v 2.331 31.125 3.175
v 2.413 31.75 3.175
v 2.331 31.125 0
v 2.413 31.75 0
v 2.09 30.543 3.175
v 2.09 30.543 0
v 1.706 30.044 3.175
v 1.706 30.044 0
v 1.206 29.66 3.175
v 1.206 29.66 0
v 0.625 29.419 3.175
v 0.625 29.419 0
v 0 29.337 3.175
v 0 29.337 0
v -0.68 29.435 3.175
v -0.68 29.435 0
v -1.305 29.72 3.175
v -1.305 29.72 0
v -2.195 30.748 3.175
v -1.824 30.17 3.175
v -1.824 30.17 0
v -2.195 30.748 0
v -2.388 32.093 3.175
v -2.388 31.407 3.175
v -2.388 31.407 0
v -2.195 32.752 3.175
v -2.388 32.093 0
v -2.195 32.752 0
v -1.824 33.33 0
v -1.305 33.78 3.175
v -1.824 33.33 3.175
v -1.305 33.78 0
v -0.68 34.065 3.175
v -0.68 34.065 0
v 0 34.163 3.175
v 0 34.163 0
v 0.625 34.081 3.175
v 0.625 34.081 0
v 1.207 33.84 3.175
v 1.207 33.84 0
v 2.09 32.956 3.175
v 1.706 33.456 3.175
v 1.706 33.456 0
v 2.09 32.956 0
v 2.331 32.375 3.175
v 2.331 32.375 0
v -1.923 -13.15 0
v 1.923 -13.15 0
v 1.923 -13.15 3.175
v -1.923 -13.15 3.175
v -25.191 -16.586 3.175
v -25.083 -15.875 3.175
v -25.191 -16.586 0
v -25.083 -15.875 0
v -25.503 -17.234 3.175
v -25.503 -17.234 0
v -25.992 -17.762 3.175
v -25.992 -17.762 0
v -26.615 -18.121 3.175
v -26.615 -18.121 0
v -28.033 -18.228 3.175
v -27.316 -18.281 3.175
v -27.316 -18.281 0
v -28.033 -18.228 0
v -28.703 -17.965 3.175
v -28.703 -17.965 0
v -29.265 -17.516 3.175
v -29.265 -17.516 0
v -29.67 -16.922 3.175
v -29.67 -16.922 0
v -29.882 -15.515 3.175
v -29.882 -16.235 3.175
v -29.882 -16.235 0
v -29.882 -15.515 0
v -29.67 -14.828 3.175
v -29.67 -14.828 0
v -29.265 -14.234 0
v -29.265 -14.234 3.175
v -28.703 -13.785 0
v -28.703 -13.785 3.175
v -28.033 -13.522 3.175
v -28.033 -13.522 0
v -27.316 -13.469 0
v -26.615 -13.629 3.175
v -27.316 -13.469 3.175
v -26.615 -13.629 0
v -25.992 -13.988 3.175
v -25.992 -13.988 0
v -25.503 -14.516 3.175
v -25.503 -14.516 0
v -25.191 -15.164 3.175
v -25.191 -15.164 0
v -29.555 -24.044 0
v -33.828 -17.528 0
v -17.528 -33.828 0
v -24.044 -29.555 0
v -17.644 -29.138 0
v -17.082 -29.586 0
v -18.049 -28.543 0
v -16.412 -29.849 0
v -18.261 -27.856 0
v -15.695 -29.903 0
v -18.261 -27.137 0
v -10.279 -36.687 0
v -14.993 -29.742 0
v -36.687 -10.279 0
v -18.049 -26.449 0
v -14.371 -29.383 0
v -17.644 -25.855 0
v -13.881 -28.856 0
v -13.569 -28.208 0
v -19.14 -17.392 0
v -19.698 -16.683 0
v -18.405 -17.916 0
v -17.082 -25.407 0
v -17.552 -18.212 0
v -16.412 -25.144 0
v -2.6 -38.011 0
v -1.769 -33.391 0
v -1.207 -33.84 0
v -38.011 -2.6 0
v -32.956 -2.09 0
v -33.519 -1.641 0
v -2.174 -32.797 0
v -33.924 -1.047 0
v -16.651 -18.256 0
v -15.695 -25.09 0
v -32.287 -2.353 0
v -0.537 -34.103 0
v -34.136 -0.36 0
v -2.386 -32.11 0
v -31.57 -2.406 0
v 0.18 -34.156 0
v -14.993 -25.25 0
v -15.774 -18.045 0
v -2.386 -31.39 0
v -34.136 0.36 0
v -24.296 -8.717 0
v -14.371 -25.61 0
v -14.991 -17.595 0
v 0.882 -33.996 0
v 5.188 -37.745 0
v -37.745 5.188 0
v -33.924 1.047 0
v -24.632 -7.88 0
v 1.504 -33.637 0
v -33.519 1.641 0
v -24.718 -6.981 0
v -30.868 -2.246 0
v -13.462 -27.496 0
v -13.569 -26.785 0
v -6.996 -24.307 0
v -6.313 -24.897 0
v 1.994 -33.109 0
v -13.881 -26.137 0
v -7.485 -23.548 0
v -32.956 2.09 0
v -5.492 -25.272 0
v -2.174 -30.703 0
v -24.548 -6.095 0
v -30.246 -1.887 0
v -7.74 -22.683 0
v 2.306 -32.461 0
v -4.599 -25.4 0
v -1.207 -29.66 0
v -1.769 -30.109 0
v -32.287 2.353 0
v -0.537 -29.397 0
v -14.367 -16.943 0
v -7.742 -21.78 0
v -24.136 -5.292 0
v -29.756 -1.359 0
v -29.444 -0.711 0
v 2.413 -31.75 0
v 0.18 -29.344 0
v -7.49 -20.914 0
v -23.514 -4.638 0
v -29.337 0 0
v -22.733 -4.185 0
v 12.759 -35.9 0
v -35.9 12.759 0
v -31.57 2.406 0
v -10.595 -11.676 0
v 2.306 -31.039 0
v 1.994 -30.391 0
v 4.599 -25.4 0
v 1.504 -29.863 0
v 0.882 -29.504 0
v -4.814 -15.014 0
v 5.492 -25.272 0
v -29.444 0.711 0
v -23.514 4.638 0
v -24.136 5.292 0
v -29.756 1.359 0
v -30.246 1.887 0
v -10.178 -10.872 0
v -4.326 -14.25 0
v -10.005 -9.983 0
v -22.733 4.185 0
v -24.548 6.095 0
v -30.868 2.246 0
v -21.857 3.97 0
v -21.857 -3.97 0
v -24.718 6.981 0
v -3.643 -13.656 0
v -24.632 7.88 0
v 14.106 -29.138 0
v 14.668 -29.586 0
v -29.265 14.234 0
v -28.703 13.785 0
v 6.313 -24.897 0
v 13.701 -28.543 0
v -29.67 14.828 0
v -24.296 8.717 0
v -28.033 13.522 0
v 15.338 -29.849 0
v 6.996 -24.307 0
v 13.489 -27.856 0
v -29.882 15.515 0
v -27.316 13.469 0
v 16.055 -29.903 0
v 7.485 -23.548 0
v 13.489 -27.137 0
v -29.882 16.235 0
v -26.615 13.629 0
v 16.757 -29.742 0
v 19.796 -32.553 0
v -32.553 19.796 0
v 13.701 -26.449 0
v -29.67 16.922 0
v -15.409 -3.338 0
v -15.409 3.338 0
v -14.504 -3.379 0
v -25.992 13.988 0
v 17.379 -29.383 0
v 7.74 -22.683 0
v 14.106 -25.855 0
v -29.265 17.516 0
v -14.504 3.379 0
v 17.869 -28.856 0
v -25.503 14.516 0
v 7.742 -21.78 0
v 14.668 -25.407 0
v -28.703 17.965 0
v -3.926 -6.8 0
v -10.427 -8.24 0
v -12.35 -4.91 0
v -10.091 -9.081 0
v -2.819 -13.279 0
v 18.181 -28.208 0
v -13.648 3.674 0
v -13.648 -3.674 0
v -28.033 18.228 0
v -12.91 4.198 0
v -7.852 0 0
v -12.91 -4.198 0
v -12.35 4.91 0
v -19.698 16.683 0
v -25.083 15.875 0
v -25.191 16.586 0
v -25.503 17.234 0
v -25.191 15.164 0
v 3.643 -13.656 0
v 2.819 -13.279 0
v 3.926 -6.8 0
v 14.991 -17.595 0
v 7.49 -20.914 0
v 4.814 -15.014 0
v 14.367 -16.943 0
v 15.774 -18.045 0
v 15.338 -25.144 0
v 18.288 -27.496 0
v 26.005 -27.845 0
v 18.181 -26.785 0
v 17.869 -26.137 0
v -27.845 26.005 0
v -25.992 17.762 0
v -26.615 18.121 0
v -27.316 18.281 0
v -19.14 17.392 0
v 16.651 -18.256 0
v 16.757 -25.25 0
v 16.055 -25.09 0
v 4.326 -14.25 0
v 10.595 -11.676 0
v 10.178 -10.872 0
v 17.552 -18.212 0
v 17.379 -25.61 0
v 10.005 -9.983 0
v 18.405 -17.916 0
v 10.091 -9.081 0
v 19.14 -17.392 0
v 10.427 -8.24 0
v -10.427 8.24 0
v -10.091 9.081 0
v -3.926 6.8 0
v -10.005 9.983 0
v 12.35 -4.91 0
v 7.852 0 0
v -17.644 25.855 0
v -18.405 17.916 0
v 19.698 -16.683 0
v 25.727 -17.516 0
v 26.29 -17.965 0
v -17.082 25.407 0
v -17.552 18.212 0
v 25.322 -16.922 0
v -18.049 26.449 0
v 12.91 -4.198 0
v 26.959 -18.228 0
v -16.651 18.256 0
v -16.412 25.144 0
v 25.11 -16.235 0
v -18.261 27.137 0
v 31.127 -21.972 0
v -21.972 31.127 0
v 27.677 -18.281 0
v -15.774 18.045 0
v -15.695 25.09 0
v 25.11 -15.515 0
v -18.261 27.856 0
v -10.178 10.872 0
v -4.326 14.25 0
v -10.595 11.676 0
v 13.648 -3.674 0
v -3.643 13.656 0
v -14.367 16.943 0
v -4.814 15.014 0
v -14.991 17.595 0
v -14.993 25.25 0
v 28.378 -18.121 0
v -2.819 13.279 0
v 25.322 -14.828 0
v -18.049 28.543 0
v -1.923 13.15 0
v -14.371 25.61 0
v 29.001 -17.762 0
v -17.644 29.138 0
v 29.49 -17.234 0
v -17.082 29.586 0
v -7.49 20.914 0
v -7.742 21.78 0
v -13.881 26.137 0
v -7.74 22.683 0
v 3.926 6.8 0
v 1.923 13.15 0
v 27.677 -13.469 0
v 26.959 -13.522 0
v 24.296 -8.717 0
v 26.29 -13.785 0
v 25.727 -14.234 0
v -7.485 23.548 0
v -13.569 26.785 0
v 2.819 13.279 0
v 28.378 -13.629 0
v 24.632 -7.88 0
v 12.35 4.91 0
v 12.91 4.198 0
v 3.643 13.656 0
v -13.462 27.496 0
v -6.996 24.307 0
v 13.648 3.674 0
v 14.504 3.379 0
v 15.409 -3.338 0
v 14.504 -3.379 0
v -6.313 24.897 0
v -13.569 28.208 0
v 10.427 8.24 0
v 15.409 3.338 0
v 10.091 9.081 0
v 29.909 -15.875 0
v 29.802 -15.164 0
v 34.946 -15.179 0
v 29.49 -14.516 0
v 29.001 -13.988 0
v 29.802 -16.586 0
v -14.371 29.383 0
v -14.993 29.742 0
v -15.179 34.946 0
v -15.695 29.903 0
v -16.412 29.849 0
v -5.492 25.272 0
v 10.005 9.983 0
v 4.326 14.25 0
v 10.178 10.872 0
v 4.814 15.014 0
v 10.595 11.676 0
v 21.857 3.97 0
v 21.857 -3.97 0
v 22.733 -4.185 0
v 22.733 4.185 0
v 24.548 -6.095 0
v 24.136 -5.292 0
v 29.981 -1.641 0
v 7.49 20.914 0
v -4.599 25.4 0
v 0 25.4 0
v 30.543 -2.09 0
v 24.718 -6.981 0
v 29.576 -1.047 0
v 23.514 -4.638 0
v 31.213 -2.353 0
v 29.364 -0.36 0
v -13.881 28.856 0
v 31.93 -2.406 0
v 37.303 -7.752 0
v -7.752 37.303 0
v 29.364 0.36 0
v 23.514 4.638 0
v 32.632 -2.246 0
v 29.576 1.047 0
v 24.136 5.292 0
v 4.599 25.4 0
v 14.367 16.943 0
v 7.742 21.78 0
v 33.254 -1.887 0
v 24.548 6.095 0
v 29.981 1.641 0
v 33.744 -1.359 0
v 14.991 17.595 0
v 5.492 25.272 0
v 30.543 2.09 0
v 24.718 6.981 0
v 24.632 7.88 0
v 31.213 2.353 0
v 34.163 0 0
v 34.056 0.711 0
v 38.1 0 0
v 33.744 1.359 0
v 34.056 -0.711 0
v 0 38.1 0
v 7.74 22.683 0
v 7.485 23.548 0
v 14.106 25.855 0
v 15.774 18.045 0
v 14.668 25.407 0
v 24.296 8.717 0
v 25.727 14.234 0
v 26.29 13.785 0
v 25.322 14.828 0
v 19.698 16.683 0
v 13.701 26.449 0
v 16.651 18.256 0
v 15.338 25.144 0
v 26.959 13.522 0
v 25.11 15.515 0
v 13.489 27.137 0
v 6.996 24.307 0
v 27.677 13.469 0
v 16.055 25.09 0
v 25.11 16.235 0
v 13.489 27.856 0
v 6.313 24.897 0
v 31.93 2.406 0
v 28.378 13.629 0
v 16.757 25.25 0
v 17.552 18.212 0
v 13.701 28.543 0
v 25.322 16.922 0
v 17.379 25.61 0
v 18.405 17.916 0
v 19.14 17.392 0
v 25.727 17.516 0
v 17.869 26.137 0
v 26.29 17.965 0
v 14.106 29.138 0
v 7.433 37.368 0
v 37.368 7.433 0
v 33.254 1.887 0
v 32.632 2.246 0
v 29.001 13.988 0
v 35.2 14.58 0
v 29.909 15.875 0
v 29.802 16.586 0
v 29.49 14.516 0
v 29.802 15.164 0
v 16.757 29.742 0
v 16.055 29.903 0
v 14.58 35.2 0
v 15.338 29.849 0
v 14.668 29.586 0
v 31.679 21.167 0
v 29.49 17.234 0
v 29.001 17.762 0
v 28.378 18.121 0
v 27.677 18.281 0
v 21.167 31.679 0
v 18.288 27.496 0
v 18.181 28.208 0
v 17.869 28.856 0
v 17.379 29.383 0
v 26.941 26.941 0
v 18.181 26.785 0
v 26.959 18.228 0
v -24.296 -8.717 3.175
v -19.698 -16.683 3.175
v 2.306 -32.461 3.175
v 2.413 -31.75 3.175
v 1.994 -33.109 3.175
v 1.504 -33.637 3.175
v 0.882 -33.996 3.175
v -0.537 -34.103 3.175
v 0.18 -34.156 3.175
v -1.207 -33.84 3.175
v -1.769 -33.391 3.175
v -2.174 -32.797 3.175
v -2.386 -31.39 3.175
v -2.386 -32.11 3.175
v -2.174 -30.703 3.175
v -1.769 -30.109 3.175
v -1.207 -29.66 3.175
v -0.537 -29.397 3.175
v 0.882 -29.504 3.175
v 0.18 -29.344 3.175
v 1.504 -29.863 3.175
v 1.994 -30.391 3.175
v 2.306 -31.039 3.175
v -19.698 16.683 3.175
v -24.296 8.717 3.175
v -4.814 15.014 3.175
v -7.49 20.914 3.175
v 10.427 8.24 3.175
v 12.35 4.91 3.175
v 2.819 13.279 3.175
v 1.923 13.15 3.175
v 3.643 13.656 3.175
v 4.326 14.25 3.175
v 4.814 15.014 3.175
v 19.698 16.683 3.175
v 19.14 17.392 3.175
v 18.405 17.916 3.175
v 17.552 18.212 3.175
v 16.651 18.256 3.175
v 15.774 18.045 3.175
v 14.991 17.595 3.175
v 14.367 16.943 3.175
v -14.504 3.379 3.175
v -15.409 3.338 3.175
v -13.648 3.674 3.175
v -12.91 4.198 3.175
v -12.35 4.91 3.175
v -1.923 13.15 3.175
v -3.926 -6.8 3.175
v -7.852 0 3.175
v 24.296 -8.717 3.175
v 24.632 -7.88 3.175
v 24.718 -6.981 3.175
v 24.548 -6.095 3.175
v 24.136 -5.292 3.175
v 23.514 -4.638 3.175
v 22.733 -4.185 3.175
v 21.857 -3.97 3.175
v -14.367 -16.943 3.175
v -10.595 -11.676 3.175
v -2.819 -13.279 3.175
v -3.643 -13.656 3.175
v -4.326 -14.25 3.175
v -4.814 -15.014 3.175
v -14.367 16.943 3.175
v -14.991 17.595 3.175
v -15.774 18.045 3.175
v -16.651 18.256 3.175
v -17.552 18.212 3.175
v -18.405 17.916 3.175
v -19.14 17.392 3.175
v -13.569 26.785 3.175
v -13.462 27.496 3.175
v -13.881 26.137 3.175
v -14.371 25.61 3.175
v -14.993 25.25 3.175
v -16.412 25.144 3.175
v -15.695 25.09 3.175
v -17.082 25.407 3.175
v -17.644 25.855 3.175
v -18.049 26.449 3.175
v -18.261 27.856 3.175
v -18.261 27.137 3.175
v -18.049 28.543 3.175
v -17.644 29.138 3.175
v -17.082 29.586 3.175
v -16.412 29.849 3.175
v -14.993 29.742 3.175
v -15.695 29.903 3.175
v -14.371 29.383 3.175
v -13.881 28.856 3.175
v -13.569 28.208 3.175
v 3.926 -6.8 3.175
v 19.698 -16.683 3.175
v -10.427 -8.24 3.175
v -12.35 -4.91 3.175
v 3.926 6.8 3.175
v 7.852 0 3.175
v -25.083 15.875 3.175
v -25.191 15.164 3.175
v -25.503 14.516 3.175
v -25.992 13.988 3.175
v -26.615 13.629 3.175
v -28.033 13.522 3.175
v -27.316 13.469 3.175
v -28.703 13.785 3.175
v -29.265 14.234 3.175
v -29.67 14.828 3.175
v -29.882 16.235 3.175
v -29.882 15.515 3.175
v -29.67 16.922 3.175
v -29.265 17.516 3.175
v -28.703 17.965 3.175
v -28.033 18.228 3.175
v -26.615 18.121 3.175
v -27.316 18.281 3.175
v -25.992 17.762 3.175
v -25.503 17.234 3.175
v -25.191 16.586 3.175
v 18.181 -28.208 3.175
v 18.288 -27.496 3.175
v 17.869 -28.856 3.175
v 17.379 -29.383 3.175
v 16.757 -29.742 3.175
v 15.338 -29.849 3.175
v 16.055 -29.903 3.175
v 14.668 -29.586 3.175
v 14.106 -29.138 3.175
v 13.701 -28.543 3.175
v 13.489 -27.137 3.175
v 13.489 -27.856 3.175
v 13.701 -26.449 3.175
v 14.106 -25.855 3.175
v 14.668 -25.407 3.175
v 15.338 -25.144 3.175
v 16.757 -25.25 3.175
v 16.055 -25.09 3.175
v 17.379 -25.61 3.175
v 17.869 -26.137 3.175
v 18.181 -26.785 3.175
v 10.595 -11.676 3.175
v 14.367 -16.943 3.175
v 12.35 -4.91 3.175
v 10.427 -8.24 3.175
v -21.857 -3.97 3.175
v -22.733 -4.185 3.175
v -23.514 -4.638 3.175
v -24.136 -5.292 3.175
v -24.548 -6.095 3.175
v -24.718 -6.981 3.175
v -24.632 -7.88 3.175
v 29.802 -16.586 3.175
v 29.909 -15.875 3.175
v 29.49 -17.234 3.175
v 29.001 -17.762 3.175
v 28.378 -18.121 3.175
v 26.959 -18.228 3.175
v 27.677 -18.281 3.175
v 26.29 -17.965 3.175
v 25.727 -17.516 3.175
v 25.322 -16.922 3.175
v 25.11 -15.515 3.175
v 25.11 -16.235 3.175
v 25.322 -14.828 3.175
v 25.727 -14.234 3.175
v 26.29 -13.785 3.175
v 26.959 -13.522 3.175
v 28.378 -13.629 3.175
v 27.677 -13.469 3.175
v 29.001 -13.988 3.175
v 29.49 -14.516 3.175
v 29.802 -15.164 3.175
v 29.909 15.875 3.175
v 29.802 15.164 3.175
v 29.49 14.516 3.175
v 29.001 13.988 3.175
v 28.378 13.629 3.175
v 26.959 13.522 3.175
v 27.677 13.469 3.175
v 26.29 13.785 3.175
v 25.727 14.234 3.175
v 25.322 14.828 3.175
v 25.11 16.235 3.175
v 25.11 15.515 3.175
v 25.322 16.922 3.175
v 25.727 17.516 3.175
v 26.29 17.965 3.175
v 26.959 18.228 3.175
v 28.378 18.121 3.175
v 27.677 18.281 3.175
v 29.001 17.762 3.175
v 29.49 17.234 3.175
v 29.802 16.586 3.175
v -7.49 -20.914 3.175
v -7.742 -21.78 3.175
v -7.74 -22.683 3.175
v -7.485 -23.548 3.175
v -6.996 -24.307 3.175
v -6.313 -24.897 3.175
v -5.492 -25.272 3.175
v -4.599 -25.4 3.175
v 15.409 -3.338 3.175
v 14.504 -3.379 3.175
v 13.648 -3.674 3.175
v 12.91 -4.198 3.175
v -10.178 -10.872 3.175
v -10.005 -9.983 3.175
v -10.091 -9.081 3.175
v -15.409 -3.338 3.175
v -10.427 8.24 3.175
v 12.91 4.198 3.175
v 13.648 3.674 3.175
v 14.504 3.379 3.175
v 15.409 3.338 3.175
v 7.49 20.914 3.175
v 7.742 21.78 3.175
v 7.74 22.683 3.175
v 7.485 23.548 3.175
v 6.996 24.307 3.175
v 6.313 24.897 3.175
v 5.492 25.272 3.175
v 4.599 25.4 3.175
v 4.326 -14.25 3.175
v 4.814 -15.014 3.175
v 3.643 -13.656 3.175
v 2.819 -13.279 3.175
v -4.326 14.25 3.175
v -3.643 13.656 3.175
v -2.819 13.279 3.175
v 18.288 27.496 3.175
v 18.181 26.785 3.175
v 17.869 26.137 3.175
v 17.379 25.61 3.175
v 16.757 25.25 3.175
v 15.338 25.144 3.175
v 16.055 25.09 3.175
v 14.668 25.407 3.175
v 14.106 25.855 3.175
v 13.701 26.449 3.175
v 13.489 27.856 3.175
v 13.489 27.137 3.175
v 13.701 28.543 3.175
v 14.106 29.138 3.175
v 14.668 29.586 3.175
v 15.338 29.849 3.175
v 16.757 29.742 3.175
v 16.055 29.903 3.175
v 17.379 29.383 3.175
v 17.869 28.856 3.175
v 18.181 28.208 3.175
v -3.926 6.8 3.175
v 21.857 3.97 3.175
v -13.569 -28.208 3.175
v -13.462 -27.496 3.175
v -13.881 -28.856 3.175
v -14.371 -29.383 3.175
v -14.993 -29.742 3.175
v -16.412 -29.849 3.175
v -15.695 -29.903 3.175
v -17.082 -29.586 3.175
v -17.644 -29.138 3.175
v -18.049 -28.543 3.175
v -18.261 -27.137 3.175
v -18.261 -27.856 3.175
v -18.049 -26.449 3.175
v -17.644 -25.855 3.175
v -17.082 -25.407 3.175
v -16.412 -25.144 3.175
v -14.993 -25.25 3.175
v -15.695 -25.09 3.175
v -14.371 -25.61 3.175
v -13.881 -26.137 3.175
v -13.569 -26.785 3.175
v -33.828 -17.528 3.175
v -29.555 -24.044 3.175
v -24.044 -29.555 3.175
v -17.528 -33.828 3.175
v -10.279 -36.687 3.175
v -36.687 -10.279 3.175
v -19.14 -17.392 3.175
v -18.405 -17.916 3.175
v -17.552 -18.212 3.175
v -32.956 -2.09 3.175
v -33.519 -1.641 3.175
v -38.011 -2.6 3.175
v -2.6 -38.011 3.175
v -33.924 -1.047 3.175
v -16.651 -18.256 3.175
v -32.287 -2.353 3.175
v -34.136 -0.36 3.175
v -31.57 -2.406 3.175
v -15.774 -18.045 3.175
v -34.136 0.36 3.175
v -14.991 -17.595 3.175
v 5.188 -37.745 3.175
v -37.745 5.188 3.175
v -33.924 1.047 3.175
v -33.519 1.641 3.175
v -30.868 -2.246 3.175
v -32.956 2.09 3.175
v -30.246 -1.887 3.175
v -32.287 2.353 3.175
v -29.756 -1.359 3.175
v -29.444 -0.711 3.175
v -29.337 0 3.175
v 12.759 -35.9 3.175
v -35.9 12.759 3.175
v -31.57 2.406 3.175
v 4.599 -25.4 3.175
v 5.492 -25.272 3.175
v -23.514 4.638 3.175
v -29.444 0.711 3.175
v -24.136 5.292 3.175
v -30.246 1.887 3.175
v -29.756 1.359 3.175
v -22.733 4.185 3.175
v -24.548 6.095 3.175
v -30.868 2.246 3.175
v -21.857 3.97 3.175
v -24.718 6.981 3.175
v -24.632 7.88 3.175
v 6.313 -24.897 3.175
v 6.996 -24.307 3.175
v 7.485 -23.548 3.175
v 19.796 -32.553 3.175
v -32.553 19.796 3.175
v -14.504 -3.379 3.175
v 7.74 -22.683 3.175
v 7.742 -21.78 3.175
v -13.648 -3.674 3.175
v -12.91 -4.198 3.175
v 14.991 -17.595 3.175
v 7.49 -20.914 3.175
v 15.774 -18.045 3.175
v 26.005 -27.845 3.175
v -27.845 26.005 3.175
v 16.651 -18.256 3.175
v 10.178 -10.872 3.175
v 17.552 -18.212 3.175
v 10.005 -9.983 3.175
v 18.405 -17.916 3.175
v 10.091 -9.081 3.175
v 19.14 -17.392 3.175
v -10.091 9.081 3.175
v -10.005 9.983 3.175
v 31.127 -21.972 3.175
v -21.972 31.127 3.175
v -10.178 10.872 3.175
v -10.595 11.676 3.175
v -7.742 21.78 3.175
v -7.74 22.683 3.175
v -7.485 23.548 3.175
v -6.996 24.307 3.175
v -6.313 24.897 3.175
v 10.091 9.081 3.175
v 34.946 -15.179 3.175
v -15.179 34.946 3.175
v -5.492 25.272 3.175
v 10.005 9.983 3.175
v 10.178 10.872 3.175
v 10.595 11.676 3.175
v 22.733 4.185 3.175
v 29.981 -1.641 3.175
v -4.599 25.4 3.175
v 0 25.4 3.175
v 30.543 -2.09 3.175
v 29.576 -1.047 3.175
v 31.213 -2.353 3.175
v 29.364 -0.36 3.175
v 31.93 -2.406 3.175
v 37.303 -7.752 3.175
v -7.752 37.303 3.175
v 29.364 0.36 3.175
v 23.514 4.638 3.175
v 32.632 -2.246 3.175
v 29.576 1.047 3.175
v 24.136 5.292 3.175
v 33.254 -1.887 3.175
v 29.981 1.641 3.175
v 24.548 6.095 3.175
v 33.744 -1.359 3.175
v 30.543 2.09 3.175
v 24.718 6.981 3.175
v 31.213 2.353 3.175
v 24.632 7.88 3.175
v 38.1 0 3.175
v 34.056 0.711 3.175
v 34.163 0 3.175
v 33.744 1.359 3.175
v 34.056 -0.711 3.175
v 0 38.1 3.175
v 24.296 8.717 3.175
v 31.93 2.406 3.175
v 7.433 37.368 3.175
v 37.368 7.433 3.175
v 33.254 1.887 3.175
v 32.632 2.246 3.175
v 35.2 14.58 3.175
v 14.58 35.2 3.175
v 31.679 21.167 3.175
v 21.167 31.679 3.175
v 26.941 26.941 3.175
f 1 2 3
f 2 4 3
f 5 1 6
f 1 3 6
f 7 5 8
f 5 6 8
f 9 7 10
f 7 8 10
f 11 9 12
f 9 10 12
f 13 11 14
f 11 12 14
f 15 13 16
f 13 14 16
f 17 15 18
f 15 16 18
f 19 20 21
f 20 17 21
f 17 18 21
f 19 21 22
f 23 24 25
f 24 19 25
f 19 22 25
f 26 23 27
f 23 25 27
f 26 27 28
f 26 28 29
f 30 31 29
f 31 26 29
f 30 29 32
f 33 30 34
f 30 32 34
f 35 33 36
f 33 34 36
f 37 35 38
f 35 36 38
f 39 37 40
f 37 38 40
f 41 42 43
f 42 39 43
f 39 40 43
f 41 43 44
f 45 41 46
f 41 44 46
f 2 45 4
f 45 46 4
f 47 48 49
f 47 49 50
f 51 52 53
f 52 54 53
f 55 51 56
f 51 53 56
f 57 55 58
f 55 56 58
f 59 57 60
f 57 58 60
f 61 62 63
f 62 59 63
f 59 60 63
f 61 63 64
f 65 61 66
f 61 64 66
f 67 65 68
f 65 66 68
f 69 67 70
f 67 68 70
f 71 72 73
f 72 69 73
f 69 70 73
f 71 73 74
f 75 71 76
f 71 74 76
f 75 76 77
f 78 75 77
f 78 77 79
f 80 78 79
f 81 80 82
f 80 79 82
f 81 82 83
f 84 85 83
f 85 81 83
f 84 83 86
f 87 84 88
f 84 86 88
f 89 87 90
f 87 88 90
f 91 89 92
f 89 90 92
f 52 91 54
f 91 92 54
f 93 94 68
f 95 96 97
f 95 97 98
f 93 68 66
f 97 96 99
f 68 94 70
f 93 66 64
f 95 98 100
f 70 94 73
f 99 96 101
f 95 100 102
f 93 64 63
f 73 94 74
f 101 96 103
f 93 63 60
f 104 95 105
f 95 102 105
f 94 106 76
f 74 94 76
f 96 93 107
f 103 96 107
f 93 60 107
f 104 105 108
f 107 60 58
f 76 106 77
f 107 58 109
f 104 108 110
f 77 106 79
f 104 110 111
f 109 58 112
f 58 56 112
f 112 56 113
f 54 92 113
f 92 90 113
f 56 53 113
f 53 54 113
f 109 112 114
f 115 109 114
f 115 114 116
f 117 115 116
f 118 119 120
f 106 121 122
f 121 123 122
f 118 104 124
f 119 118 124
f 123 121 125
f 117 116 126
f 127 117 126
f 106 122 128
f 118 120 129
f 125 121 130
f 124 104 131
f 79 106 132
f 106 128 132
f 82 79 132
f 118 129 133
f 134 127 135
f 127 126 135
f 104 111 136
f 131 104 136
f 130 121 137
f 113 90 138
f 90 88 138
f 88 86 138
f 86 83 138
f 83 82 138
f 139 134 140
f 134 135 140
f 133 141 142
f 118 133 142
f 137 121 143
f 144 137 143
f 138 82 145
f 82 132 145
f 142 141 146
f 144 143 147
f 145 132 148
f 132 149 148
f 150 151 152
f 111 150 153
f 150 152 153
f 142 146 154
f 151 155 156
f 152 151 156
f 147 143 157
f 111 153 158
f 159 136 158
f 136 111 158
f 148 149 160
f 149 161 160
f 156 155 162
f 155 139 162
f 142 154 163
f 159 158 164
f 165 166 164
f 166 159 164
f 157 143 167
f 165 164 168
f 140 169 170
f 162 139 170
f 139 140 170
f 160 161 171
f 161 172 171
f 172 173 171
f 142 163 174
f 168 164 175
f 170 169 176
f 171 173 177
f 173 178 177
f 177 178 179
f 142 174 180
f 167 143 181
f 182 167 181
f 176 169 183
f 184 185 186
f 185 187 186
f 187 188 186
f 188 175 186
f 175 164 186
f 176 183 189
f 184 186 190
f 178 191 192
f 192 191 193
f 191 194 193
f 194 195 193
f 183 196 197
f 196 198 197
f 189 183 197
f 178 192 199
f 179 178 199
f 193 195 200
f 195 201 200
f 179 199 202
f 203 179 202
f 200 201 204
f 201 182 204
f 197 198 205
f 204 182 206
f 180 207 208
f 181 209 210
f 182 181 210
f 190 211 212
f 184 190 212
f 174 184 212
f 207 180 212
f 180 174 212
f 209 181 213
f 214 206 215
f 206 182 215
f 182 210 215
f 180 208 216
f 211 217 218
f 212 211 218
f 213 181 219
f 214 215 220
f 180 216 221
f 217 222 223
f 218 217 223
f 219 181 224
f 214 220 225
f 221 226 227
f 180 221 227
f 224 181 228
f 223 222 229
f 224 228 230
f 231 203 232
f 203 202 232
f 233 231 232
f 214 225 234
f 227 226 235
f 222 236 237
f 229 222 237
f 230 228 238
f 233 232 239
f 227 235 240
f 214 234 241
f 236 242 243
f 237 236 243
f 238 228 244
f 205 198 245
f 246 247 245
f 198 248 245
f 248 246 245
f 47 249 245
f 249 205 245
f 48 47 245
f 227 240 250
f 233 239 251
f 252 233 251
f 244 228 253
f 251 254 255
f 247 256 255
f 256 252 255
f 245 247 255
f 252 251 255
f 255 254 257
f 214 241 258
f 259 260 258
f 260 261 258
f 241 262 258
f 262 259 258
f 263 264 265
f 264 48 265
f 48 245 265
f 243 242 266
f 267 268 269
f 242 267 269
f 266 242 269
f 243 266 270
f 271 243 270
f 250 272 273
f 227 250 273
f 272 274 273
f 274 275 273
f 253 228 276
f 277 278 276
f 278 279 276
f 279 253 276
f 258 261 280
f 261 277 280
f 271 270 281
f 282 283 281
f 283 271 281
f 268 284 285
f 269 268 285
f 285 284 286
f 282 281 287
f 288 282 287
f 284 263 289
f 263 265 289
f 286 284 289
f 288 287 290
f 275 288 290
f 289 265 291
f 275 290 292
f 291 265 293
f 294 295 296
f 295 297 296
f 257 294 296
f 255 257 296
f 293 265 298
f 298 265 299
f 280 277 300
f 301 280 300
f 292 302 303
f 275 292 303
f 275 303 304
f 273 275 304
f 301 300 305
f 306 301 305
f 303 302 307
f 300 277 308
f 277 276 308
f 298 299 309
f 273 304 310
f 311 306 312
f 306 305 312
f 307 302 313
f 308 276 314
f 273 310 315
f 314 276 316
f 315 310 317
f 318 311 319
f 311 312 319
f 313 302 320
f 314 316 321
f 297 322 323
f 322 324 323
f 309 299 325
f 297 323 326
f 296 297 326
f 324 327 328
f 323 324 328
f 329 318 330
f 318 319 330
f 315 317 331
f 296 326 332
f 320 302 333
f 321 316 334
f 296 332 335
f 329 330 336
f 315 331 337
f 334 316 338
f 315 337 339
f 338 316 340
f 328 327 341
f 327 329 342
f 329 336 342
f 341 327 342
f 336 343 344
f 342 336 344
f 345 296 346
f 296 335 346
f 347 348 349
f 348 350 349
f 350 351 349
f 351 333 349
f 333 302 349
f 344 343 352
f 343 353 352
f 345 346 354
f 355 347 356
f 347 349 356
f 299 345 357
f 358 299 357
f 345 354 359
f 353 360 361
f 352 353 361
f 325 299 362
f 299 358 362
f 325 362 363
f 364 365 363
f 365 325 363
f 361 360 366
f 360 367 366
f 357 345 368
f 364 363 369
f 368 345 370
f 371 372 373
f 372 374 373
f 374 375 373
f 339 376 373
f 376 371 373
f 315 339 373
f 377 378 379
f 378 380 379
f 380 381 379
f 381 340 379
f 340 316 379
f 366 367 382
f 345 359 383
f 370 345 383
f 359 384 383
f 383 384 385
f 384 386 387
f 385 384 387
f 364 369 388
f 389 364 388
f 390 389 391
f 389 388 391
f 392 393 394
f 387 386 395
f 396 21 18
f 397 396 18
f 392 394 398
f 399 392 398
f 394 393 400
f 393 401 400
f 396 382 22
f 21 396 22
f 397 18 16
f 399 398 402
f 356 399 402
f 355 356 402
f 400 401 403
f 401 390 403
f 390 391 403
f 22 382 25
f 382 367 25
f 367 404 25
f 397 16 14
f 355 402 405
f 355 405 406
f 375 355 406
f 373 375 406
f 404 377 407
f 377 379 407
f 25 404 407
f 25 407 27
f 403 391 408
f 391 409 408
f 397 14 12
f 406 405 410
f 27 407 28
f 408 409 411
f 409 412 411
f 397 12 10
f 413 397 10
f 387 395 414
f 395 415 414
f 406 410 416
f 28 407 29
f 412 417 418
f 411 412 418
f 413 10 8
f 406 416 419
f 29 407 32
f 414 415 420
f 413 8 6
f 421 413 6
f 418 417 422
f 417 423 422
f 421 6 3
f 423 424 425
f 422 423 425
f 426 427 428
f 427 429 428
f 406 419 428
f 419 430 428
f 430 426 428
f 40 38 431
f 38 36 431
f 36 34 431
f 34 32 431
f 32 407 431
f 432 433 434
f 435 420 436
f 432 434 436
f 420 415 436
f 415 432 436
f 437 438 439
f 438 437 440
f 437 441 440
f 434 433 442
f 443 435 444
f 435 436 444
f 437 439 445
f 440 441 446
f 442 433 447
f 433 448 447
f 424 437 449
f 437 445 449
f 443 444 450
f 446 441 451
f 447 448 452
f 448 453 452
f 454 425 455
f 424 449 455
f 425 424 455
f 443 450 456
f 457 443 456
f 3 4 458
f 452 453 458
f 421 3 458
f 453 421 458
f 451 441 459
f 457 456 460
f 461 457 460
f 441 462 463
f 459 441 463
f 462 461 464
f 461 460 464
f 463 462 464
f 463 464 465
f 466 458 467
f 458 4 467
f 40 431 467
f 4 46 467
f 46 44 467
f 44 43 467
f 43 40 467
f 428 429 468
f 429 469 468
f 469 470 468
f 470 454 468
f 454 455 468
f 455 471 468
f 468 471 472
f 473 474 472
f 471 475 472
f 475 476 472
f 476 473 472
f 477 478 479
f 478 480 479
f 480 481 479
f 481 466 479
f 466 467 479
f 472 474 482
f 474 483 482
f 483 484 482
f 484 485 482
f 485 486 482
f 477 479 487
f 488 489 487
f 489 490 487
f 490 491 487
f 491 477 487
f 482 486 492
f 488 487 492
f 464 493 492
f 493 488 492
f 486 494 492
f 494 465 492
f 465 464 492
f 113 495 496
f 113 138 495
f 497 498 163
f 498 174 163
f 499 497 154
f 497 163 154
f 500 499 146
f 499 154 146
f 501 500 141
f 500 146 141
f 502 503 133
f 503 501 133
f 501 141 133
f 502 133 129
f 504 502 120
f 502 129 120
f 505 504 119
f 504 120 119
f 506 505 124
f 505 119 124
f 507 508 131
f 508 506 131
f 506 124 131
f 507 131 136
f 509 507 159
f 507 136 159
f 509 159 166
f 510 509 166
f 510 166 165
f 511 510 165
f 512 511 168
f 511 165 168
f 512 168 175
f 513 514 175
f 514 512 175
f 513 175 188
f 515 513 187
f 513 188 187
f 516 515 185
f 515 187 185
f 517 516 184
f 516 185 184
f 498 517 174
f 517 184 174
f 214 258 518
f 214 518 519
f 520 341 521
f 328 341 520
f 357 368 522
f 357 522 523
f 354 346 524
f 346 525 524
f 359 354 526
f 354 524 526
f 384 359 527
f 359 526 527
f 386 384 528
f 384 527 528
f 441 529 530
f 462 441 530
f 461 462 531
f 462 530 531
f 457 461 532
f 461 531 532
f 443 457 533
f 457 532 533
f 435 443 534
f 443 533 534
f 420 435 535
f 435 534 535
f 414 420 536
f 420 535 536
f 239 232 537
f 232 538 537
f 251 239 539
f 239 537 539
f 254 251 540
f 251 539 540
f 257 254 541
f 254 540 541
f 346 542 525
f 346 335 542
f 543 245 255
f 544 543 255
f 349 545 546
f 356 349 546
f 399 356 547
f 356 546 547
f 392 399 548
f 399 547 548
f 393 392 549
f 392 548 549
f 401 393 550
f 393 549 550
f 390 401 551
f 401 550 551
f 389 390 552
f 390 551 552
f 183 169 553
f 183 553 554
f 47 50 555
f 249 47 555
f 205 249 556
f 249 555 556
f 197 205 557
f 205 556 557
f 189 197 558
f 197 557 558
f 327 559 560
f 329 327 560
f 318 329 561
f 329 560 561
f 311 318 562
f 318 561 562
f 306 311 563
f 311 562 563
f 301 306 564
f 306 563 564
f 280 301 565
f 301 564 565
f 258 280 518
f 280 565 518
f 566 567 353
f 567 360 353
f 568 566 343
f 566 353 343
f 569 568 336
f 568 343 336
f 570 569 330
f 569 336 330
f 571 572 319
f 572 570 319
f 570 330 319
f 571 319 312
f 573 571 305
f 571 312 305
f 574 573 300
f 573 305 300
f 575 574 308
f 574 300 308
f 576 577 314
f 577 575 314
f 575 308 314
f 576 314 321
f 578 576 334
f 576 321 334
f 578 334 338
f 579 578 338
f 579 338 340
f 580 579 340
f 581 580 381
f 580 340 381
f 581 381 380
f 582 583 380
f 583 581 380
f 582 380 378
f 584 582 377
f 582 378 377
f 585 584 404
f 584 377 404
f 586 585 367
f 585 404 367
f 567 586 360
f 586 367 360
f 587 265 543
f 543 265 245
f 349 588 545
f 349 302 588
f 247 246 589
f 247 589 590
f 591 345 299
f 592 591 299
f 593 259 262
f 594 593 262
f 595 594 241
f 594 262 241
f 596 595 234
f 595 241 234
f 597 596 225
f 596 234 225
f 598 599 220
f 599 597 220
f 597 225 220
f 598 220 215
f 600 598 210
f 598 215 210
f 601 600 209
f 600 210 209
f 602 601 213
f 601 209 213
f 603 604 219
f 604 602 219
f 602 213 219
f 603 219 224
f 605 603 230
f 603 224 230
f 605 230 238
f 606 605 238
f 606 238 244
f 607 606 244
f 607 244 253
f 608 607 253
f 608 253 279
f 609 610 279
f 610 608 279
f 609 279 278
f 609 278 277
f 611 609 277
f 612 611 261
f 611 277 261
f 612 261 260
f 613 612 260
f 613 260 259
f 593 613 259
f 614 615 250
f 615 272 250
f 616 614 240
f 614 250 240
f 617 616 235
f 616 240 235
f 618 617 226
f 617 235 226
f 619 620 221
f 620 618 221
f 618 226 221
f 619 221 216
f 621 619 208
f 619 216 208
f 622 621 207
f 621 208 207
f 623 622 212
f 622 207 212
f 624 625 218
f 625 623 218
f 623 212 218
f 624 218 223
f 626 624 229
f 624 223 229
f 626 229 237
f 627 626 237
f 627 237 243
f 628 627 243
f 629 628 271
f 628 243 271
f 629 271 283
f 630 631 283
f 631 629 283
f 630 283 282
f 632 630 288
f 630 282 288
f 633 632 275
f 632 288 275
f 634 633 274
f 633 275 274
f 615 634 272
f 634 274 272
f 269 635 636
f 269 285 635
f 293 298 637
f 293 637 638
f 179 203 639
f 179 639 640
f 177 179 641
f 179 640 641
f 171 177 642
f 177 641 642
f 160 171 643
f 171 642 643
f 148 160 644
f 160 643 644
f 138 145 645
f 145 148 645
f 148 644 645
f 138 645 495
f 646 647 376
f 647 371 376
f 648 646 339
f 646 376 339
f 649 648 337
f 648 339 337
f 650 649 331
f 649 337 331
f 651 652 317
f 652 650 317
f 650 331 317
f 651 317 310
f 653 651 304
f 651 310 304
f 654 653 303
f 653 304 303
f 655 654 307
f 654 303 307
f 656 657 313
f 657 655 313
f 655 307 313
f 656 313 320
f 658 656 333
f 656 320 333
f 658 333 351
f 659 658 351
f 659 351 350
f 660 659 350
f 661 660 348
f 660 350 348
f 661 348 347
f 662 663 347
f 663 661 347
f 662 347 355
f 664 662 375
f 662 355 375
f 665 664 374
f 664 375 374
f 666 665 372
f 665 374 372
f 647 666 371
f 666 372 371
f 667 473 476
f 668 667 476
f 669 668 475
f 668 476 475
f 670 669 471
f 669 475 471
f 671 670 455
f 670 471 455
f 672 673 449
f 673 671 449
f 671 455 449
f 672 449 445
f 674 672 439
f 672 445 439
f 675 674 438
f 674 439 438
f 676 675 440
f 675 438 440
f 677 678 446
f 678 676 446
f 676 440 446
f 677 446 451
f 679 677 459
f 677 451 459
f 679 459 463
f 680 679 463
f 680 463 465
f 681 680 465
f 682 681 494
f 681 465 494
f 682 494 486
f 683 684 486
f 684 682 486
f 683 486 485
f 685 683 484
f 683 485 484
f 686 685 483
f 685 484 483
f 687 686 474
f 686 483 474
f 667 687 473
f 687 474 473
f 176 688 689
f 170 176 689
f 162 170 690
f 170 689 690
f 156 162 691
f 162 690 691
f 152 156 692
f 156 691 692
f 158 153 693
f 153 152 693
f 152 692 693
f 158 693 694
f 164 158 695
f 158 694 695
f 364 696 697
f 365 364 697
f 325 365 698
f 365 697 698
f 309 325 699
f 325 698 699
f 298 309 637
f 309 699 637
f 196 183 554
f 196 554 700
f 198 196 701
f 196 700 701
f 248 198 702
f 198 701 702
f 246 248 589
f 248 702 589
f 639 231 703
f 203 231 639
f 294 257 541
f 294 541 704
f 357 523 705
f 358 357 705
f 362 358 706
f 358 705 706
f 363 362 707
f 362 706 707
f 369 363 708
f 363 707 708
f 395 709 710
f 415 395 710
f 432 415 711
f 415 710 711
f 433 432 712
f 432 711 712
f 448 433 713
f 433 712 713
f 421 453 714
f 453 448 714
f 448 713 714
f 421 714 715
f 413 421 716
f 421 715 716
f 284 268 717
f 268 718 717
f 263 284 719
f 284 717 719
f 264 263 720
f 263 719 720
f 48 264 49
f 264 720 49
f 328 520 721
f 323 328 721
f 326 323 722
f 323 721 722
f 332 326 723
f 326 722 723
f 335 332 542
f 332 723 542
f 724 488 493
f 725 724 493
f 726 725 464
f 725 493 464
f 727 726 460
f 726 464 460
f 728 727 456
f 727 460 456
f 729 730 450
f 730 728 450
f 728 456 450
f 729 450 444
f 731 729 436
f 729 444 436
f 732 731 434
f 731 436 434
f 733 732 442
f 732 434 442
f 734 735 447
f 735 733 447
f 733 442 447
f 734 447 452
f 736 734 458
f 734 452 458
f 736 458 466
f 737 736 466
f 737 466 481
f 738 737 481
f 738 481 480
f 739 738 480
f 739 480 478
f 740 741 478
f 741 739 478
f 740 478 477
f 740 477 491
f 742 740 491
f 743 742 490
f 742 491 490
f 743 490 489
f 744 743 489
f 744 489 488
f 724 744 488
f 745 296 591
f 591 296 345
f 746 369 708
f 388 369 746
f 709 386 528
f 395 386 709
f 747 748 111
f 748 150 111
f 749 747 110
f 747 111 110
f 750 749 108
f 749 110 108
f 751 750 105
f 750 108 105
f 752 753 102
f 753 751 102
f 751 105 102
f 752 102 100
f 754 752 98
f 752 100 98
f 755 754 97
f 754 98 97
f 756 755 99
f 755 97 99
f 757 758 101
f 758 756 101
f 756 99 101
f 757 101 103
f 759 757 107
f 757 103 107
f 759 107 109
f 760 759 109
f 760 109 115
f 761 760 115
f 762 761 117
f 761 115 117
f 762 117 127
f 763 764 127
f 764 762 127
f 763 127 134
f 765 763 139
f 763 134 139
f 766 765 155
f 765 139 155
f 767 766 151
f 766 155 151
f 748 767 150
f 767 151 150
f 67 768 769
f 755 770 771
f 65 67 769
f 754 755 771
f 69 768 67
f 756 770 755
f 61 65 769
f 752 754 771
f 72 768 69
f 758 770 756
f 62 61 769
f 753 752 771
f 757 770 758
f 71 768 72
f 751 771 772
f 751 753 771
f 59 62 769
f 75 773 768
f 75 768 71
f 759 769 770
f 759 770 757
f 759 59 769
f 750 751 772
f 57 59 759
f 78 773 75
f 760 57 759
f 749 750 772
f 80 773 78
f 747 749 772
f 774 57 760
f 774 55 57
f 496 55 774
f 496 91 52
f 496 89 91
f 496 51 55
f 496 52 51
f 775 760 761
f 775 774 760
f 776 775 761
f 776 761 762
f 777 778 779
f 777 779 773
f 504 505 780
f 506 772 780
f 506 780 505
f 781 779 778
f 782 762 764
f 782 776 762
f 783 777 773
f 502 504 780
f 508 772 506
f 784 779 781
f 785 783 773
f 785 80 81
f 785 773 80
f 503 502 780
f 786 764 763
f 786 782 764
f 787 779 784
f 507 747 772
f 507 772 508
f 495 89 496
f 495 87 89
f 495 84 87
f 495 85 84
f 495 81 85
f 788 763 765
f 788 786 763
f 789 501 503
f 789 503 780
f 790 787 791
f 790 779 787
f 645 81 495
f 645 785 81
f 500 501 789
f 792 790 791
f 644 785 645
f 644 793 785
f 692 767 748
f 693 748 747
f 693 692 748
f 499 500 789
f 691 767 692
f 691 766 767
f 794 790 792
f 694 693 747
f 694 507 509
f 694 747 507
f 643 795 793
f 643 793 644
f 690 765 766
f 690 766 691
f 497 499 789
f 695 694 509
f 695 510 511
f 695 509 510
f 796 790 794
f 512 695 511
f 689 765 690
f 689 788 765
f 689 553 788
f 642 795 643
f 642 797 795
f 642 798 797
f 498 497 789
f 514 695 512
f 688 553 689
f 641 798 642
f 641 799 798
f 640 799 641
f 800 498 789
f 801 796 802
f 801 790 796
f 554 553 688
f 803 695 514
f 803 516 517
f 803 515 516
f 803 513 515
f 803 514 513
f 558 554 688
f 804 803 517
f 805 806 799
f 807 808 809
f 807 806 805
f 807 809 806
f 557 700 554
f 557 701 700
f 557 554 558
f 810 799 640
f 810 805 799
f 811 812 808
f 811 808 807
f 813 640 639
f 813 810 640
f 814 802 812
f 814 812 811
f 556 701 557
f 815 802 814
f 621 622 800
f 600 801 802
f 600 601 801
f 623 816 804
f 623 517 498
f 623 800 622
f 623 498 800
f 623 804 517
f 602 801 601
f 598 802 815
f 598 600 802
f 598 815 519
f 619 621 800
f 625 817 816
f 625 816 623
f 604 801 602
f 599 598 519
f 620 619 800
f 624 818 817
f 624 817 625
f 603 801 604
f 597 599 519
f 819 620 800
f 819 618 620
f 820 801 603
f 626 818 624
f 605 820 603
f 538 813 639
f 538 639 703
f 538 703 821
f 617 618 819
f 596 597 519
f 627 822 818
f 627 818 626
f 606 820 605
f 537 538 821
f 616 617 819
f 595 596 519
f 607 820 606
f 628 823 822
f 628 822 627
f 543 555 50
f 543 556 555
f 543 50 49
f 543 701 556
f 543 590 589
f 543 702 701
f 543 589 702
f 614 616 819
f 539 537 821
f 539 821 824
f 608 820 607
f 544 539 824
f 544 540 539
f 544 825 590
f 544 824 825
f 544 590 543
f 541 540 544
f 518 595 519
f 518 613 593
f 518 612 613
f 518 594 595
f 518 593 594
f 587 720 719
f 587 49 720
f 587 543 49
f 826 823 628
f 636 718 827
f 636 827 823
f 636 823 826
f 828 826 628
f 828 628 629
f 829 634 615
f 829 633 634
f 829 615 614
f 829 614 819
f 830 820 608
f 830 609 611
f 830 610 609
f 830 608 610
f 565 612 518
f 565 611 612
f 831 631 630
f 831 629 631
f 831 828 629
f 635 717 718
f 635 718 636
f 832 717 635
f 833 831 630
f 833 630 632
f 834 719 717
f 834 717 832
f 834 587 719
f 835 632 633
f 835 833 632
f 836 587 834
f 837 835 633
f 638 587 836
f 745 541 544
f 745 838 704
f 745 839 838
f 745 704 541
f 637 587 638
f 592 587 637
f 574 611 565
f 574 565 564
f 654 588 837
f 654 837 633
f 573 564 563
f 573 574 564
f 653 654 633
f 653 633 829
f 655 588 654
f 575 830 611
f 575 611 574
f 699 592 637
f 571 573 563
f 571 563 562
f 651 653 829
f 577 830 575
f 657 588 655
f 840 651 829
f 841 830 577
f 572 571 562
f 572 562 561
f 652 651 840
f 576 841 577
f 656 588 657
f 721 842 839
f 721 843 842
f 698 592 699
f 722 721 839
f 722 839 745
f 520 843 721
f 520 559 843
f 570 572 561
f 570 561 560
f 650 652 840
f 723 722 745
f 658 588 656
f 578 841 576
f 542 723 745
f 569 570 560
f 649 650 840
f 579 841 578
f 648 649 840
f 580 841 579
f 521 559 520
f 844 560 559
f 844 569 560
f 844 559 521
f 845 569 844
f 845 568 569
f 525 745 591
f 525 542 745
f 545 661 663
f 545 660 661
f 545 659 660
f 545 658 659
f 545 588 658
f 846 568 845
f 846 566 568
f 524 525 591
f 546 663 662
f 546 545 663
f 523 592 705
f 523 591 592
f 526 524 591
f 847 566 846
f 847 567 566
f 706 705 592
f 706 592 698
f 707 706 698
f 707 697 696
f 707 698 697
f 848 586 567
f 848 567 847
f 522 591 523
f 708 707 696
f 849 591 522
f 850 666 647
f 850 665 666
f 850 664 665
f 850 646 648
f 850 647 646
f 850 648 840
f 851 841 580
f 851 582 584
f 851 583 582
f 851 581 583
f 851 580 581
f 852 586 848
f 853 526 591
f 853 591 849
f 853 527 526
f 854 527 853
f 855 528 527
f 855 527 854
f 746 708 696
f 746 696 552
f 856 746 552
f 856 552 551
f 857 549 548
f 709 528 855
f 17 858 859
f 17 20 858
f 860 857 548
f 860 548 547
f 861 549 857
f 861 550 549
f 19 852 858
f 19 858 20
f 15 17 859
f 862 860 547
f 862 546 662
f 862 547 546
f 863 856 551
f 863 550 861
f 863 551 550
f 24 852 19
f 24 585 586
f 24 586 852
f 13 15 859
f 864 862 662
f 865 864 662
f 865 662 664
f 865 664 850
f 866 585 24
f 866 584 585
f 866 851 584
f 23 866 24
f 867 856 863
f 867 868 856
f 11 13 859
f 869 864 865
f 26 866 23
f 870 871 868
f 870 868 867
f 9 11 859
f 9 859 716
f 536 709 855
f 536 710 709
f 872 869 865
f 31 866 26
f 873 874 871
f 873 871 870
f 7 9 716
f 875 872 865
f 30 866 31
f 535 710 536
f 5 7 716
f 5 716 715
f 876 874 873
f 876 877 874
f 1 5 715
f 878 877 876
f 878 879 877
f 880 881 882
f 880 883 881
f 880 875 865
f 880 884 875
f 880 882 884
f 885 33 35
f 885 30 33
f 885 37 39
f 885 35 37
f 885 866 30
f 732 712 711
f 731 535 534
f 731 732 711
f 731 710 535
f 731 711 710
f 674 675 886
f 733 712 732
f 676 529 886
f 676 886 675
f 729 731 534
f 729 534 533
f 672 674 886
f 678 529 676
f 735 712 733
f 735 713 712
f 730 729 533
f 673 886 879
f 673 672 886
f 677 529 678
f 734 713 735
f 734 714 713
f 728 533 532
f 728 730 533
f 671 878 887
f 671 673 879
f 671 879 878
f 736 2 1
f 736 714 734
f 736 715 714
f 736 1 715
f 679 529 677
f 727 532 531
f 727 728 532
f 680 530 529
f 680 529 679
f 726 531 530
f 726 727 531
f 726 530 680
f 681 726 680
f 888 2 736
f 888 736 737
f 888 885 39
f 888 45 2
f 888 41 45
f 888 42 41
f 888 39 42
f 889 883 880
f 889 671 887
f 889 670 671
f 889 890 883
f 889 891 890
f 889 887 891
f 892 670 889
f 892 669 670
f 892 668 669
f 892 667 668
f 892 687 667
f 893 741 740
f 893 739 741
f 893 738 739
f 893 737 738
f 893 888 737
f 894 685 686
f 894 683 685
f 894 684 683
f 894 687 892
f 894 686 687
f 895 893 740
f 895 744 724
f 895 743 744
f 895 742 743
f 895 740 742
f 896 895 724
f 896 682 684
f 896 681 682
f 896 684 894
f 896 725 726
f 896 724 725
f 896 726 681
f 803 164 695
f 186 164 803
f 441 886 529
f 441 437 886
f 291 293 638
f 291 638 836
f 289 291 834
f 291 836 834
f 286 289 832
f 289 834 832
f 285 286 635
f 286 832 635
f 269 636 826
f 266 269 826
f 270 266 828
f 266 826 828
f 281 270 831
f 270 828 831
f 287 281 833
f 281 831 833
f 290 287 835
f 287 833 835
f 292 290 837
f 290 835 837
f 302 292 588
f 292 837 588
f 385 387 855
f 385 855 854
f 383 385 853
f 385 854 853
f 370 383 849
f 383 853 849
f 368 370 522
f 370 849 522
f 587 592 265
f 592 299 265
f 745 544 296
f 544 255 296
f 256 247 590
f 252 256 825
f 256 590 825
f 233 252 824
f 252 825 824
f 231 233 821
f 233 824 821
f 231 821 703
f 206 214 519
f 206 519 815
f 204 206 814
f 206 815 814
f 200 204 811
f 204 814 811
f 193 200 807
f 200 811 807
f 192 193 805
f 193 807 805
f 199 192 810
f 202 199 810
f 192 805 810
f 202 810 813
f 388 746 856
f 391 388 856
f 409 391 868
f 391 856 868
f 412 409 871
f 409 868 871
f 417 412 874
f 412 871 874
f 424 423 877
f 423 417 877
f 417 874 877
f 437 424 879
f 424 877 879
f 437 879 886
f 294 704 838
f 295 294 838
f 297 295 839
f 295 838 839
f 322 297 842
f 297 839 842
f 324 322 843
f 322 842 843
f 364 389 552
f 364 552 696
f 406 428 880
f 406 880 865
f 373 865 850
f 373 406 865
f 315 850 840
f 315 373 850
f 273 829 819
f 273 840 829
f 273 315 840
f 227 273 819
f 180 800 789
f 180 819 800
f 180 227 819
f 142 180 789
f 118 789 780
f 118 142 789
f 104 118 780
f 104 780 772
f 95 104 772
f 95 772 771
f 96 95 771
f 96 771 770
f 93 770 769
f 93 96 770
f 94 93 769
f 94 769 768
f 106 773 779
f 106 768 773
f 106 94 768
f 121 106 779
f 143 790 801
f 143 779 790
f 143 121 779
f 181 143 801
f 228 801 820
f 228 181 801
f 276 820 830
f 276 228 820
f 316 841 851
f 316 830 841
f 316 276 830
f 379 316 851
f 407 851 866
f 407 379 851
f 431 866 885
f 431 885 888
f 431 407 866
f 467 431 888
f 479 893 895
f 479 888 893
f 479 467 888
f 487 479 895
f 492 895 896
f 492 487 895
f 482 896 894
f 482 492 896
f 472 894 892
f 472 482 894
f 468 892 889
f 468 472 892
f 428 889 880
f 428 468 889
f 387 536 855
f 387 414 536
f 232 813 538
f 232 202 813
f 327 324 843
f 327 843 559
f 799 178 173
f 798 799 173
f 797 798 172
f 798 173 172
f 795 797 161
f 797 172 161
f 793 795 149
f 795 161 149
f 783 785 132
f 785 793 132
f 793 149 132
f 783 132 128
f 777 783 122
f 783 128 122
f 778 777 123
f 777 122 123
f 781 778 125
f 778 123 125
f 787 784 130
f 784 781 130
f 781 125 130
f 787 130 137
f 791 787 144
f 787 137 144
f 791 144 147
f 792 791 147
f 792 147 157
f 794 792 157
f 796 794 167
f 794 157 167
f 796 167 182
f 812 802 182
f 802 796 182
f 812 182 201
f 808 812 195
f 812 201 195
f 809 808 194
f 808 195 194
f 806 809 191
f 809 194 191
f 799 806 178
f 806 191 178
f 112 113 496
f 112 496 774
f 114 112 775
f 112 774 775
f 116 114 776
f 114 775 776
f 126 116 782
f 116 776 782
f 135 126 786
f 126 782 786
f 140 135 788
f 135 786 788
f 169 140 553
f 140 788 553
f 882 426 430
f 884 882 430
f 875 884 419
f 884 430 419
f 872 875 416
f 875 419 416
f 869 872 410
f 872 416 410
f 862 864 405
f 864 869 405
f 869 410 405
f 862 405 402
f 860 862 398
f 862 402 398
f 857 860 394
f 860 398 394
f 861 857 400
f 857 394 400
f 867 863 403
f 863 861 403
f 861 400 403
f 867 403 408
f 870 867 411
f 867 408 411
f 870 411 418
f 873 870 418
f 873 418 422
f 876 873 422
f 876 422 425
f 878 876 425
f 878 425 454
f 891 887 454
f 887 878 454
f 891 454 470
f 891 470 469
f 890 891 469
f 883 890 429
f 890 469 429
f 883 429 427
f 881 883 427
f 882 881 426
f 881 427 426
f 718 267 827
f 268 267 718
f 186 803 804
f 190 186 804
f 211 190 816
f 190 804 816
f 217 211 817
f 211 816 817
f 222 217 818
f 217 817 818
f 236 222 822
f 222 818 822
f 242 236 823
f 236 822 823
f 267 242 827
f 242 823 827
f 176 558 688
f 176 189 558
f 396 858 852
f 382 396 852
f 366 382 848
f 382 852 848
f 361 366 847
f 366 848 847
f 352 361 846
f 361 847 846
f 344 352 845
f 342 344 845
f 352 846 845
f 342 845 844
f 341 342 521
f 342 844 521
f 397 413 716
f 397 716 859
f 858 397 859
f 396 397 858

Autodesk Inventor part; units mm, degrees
ref_plane "YZ Plane" through (0, 0, 0) normal (1, 0, 0) x (0, 1, 0)
ref_plane "XZ Plane" through (0, 0, 0) normal (0, 1, 0) x (-1, 0, 0)
ref_plane "XY Plane" through (0, 0, 0) normal (0, 0, 1) x (1, 0, 0)
sketch "Sketch1" plane through (0, 0, 0) normal (0, 0, 1) x (1, 0, 0)
  circle A0 centre (0, 0) radius 38.1
  line L0 (7.852, 0) -> (3.926, -6.8)
  line L1 (3.926, -6.8) -> (-3.926, -6.8)
  line L2 (-3.926, -6.8) -> (-7.852, 0)
  line L3 (-7.852, 0) -> (-3.926, 6.8)
  line L4 (-3.926, 6.8) -> (3.926, 6.8)
  line L5 (3.926, 6.8) -> (7.852, 0)
  circle A1 centre (0, 0) radius 31.75 construction
  circle A2 centre (0, 31.75) radius 2.413
  circle A3 centre (-15.875, 27.4963) radius 2.413
  circle A4 centre (-27.4963, 15.875) radius 2.413
  circle A5 centre (-31.75, 0) radius 2.413
  circle A6 centre (-27.4963, -15.875) radius 2.413
  circle A7 centre (-15.875, -27.4963) radius 2.413
  circle A8 centre (0, -31.75) radius 2.413
  circle A9 centre (15.875, -27.4963) radius 2.413
  circle A10 centre (27.4963, -15.875) radius 2.413
  circle A11 centre (31.75, 0) radius 2.413
  circle A12 centre (27.4963, 15.875) radius 2.413
  circle A13 centre (15.875, 27.4963) radius 2.413
  line L6 (-9.525, 25.4) -> (-3.9688, 13.15)
  line L7 (-3.9688, 13.15) -> (3.9688, 13.15)
  line L8 (3.9688, 13.15) -> (9.525, 25.4)
  line L9 (9.525, 25.4) -> (-9.525, 25.4)
  line L10 (0, -53.34) -> (0, 53.34) construction
  circle A14 centre (0, 0) radius 25.4 construction
  line L11 (0, 29.337) -> (0, 25.4)
  line L12 (0, 38.1) -> (0, 25.4)
  dimension "d0" = 76.2
  dimension "d2" = 63.5
  dimension "d3" = 4.826
  dimension "d1" = 13.6
  dimension "d6" = 360
  dimension "d16" = 6.35
  dimension "d18" = 7.9375
  dimension "d19" = 19.05
  dimension "d20" = 12.7
extrude "Extrusion1" add sketch "Sketch1" along normal blind 3.175 contours L9 L8 L7 L6 | A0
extrude "Extrusion2" cut sketch "Sketch1" along normal blind 3.175 contours L9 L8 L7 L6
fillet "Fillet1" radius 3.175 4 edges at (-9.525, 25.4, 1.5875) (9.525, 25.4, 1.5875) (-3.9688, 13.15, 1.5875) (3.9688, 13.15, 1.5875)
pattern_circular "Circular Pattern1" count 6 over 360 about axis through (0, 0, 0) along (0, 0, 1) of "Extrusion2", "Fillet1"
properties part number "ThickWheelPlate_v83DPrintable" material "Steel, Alloy"
